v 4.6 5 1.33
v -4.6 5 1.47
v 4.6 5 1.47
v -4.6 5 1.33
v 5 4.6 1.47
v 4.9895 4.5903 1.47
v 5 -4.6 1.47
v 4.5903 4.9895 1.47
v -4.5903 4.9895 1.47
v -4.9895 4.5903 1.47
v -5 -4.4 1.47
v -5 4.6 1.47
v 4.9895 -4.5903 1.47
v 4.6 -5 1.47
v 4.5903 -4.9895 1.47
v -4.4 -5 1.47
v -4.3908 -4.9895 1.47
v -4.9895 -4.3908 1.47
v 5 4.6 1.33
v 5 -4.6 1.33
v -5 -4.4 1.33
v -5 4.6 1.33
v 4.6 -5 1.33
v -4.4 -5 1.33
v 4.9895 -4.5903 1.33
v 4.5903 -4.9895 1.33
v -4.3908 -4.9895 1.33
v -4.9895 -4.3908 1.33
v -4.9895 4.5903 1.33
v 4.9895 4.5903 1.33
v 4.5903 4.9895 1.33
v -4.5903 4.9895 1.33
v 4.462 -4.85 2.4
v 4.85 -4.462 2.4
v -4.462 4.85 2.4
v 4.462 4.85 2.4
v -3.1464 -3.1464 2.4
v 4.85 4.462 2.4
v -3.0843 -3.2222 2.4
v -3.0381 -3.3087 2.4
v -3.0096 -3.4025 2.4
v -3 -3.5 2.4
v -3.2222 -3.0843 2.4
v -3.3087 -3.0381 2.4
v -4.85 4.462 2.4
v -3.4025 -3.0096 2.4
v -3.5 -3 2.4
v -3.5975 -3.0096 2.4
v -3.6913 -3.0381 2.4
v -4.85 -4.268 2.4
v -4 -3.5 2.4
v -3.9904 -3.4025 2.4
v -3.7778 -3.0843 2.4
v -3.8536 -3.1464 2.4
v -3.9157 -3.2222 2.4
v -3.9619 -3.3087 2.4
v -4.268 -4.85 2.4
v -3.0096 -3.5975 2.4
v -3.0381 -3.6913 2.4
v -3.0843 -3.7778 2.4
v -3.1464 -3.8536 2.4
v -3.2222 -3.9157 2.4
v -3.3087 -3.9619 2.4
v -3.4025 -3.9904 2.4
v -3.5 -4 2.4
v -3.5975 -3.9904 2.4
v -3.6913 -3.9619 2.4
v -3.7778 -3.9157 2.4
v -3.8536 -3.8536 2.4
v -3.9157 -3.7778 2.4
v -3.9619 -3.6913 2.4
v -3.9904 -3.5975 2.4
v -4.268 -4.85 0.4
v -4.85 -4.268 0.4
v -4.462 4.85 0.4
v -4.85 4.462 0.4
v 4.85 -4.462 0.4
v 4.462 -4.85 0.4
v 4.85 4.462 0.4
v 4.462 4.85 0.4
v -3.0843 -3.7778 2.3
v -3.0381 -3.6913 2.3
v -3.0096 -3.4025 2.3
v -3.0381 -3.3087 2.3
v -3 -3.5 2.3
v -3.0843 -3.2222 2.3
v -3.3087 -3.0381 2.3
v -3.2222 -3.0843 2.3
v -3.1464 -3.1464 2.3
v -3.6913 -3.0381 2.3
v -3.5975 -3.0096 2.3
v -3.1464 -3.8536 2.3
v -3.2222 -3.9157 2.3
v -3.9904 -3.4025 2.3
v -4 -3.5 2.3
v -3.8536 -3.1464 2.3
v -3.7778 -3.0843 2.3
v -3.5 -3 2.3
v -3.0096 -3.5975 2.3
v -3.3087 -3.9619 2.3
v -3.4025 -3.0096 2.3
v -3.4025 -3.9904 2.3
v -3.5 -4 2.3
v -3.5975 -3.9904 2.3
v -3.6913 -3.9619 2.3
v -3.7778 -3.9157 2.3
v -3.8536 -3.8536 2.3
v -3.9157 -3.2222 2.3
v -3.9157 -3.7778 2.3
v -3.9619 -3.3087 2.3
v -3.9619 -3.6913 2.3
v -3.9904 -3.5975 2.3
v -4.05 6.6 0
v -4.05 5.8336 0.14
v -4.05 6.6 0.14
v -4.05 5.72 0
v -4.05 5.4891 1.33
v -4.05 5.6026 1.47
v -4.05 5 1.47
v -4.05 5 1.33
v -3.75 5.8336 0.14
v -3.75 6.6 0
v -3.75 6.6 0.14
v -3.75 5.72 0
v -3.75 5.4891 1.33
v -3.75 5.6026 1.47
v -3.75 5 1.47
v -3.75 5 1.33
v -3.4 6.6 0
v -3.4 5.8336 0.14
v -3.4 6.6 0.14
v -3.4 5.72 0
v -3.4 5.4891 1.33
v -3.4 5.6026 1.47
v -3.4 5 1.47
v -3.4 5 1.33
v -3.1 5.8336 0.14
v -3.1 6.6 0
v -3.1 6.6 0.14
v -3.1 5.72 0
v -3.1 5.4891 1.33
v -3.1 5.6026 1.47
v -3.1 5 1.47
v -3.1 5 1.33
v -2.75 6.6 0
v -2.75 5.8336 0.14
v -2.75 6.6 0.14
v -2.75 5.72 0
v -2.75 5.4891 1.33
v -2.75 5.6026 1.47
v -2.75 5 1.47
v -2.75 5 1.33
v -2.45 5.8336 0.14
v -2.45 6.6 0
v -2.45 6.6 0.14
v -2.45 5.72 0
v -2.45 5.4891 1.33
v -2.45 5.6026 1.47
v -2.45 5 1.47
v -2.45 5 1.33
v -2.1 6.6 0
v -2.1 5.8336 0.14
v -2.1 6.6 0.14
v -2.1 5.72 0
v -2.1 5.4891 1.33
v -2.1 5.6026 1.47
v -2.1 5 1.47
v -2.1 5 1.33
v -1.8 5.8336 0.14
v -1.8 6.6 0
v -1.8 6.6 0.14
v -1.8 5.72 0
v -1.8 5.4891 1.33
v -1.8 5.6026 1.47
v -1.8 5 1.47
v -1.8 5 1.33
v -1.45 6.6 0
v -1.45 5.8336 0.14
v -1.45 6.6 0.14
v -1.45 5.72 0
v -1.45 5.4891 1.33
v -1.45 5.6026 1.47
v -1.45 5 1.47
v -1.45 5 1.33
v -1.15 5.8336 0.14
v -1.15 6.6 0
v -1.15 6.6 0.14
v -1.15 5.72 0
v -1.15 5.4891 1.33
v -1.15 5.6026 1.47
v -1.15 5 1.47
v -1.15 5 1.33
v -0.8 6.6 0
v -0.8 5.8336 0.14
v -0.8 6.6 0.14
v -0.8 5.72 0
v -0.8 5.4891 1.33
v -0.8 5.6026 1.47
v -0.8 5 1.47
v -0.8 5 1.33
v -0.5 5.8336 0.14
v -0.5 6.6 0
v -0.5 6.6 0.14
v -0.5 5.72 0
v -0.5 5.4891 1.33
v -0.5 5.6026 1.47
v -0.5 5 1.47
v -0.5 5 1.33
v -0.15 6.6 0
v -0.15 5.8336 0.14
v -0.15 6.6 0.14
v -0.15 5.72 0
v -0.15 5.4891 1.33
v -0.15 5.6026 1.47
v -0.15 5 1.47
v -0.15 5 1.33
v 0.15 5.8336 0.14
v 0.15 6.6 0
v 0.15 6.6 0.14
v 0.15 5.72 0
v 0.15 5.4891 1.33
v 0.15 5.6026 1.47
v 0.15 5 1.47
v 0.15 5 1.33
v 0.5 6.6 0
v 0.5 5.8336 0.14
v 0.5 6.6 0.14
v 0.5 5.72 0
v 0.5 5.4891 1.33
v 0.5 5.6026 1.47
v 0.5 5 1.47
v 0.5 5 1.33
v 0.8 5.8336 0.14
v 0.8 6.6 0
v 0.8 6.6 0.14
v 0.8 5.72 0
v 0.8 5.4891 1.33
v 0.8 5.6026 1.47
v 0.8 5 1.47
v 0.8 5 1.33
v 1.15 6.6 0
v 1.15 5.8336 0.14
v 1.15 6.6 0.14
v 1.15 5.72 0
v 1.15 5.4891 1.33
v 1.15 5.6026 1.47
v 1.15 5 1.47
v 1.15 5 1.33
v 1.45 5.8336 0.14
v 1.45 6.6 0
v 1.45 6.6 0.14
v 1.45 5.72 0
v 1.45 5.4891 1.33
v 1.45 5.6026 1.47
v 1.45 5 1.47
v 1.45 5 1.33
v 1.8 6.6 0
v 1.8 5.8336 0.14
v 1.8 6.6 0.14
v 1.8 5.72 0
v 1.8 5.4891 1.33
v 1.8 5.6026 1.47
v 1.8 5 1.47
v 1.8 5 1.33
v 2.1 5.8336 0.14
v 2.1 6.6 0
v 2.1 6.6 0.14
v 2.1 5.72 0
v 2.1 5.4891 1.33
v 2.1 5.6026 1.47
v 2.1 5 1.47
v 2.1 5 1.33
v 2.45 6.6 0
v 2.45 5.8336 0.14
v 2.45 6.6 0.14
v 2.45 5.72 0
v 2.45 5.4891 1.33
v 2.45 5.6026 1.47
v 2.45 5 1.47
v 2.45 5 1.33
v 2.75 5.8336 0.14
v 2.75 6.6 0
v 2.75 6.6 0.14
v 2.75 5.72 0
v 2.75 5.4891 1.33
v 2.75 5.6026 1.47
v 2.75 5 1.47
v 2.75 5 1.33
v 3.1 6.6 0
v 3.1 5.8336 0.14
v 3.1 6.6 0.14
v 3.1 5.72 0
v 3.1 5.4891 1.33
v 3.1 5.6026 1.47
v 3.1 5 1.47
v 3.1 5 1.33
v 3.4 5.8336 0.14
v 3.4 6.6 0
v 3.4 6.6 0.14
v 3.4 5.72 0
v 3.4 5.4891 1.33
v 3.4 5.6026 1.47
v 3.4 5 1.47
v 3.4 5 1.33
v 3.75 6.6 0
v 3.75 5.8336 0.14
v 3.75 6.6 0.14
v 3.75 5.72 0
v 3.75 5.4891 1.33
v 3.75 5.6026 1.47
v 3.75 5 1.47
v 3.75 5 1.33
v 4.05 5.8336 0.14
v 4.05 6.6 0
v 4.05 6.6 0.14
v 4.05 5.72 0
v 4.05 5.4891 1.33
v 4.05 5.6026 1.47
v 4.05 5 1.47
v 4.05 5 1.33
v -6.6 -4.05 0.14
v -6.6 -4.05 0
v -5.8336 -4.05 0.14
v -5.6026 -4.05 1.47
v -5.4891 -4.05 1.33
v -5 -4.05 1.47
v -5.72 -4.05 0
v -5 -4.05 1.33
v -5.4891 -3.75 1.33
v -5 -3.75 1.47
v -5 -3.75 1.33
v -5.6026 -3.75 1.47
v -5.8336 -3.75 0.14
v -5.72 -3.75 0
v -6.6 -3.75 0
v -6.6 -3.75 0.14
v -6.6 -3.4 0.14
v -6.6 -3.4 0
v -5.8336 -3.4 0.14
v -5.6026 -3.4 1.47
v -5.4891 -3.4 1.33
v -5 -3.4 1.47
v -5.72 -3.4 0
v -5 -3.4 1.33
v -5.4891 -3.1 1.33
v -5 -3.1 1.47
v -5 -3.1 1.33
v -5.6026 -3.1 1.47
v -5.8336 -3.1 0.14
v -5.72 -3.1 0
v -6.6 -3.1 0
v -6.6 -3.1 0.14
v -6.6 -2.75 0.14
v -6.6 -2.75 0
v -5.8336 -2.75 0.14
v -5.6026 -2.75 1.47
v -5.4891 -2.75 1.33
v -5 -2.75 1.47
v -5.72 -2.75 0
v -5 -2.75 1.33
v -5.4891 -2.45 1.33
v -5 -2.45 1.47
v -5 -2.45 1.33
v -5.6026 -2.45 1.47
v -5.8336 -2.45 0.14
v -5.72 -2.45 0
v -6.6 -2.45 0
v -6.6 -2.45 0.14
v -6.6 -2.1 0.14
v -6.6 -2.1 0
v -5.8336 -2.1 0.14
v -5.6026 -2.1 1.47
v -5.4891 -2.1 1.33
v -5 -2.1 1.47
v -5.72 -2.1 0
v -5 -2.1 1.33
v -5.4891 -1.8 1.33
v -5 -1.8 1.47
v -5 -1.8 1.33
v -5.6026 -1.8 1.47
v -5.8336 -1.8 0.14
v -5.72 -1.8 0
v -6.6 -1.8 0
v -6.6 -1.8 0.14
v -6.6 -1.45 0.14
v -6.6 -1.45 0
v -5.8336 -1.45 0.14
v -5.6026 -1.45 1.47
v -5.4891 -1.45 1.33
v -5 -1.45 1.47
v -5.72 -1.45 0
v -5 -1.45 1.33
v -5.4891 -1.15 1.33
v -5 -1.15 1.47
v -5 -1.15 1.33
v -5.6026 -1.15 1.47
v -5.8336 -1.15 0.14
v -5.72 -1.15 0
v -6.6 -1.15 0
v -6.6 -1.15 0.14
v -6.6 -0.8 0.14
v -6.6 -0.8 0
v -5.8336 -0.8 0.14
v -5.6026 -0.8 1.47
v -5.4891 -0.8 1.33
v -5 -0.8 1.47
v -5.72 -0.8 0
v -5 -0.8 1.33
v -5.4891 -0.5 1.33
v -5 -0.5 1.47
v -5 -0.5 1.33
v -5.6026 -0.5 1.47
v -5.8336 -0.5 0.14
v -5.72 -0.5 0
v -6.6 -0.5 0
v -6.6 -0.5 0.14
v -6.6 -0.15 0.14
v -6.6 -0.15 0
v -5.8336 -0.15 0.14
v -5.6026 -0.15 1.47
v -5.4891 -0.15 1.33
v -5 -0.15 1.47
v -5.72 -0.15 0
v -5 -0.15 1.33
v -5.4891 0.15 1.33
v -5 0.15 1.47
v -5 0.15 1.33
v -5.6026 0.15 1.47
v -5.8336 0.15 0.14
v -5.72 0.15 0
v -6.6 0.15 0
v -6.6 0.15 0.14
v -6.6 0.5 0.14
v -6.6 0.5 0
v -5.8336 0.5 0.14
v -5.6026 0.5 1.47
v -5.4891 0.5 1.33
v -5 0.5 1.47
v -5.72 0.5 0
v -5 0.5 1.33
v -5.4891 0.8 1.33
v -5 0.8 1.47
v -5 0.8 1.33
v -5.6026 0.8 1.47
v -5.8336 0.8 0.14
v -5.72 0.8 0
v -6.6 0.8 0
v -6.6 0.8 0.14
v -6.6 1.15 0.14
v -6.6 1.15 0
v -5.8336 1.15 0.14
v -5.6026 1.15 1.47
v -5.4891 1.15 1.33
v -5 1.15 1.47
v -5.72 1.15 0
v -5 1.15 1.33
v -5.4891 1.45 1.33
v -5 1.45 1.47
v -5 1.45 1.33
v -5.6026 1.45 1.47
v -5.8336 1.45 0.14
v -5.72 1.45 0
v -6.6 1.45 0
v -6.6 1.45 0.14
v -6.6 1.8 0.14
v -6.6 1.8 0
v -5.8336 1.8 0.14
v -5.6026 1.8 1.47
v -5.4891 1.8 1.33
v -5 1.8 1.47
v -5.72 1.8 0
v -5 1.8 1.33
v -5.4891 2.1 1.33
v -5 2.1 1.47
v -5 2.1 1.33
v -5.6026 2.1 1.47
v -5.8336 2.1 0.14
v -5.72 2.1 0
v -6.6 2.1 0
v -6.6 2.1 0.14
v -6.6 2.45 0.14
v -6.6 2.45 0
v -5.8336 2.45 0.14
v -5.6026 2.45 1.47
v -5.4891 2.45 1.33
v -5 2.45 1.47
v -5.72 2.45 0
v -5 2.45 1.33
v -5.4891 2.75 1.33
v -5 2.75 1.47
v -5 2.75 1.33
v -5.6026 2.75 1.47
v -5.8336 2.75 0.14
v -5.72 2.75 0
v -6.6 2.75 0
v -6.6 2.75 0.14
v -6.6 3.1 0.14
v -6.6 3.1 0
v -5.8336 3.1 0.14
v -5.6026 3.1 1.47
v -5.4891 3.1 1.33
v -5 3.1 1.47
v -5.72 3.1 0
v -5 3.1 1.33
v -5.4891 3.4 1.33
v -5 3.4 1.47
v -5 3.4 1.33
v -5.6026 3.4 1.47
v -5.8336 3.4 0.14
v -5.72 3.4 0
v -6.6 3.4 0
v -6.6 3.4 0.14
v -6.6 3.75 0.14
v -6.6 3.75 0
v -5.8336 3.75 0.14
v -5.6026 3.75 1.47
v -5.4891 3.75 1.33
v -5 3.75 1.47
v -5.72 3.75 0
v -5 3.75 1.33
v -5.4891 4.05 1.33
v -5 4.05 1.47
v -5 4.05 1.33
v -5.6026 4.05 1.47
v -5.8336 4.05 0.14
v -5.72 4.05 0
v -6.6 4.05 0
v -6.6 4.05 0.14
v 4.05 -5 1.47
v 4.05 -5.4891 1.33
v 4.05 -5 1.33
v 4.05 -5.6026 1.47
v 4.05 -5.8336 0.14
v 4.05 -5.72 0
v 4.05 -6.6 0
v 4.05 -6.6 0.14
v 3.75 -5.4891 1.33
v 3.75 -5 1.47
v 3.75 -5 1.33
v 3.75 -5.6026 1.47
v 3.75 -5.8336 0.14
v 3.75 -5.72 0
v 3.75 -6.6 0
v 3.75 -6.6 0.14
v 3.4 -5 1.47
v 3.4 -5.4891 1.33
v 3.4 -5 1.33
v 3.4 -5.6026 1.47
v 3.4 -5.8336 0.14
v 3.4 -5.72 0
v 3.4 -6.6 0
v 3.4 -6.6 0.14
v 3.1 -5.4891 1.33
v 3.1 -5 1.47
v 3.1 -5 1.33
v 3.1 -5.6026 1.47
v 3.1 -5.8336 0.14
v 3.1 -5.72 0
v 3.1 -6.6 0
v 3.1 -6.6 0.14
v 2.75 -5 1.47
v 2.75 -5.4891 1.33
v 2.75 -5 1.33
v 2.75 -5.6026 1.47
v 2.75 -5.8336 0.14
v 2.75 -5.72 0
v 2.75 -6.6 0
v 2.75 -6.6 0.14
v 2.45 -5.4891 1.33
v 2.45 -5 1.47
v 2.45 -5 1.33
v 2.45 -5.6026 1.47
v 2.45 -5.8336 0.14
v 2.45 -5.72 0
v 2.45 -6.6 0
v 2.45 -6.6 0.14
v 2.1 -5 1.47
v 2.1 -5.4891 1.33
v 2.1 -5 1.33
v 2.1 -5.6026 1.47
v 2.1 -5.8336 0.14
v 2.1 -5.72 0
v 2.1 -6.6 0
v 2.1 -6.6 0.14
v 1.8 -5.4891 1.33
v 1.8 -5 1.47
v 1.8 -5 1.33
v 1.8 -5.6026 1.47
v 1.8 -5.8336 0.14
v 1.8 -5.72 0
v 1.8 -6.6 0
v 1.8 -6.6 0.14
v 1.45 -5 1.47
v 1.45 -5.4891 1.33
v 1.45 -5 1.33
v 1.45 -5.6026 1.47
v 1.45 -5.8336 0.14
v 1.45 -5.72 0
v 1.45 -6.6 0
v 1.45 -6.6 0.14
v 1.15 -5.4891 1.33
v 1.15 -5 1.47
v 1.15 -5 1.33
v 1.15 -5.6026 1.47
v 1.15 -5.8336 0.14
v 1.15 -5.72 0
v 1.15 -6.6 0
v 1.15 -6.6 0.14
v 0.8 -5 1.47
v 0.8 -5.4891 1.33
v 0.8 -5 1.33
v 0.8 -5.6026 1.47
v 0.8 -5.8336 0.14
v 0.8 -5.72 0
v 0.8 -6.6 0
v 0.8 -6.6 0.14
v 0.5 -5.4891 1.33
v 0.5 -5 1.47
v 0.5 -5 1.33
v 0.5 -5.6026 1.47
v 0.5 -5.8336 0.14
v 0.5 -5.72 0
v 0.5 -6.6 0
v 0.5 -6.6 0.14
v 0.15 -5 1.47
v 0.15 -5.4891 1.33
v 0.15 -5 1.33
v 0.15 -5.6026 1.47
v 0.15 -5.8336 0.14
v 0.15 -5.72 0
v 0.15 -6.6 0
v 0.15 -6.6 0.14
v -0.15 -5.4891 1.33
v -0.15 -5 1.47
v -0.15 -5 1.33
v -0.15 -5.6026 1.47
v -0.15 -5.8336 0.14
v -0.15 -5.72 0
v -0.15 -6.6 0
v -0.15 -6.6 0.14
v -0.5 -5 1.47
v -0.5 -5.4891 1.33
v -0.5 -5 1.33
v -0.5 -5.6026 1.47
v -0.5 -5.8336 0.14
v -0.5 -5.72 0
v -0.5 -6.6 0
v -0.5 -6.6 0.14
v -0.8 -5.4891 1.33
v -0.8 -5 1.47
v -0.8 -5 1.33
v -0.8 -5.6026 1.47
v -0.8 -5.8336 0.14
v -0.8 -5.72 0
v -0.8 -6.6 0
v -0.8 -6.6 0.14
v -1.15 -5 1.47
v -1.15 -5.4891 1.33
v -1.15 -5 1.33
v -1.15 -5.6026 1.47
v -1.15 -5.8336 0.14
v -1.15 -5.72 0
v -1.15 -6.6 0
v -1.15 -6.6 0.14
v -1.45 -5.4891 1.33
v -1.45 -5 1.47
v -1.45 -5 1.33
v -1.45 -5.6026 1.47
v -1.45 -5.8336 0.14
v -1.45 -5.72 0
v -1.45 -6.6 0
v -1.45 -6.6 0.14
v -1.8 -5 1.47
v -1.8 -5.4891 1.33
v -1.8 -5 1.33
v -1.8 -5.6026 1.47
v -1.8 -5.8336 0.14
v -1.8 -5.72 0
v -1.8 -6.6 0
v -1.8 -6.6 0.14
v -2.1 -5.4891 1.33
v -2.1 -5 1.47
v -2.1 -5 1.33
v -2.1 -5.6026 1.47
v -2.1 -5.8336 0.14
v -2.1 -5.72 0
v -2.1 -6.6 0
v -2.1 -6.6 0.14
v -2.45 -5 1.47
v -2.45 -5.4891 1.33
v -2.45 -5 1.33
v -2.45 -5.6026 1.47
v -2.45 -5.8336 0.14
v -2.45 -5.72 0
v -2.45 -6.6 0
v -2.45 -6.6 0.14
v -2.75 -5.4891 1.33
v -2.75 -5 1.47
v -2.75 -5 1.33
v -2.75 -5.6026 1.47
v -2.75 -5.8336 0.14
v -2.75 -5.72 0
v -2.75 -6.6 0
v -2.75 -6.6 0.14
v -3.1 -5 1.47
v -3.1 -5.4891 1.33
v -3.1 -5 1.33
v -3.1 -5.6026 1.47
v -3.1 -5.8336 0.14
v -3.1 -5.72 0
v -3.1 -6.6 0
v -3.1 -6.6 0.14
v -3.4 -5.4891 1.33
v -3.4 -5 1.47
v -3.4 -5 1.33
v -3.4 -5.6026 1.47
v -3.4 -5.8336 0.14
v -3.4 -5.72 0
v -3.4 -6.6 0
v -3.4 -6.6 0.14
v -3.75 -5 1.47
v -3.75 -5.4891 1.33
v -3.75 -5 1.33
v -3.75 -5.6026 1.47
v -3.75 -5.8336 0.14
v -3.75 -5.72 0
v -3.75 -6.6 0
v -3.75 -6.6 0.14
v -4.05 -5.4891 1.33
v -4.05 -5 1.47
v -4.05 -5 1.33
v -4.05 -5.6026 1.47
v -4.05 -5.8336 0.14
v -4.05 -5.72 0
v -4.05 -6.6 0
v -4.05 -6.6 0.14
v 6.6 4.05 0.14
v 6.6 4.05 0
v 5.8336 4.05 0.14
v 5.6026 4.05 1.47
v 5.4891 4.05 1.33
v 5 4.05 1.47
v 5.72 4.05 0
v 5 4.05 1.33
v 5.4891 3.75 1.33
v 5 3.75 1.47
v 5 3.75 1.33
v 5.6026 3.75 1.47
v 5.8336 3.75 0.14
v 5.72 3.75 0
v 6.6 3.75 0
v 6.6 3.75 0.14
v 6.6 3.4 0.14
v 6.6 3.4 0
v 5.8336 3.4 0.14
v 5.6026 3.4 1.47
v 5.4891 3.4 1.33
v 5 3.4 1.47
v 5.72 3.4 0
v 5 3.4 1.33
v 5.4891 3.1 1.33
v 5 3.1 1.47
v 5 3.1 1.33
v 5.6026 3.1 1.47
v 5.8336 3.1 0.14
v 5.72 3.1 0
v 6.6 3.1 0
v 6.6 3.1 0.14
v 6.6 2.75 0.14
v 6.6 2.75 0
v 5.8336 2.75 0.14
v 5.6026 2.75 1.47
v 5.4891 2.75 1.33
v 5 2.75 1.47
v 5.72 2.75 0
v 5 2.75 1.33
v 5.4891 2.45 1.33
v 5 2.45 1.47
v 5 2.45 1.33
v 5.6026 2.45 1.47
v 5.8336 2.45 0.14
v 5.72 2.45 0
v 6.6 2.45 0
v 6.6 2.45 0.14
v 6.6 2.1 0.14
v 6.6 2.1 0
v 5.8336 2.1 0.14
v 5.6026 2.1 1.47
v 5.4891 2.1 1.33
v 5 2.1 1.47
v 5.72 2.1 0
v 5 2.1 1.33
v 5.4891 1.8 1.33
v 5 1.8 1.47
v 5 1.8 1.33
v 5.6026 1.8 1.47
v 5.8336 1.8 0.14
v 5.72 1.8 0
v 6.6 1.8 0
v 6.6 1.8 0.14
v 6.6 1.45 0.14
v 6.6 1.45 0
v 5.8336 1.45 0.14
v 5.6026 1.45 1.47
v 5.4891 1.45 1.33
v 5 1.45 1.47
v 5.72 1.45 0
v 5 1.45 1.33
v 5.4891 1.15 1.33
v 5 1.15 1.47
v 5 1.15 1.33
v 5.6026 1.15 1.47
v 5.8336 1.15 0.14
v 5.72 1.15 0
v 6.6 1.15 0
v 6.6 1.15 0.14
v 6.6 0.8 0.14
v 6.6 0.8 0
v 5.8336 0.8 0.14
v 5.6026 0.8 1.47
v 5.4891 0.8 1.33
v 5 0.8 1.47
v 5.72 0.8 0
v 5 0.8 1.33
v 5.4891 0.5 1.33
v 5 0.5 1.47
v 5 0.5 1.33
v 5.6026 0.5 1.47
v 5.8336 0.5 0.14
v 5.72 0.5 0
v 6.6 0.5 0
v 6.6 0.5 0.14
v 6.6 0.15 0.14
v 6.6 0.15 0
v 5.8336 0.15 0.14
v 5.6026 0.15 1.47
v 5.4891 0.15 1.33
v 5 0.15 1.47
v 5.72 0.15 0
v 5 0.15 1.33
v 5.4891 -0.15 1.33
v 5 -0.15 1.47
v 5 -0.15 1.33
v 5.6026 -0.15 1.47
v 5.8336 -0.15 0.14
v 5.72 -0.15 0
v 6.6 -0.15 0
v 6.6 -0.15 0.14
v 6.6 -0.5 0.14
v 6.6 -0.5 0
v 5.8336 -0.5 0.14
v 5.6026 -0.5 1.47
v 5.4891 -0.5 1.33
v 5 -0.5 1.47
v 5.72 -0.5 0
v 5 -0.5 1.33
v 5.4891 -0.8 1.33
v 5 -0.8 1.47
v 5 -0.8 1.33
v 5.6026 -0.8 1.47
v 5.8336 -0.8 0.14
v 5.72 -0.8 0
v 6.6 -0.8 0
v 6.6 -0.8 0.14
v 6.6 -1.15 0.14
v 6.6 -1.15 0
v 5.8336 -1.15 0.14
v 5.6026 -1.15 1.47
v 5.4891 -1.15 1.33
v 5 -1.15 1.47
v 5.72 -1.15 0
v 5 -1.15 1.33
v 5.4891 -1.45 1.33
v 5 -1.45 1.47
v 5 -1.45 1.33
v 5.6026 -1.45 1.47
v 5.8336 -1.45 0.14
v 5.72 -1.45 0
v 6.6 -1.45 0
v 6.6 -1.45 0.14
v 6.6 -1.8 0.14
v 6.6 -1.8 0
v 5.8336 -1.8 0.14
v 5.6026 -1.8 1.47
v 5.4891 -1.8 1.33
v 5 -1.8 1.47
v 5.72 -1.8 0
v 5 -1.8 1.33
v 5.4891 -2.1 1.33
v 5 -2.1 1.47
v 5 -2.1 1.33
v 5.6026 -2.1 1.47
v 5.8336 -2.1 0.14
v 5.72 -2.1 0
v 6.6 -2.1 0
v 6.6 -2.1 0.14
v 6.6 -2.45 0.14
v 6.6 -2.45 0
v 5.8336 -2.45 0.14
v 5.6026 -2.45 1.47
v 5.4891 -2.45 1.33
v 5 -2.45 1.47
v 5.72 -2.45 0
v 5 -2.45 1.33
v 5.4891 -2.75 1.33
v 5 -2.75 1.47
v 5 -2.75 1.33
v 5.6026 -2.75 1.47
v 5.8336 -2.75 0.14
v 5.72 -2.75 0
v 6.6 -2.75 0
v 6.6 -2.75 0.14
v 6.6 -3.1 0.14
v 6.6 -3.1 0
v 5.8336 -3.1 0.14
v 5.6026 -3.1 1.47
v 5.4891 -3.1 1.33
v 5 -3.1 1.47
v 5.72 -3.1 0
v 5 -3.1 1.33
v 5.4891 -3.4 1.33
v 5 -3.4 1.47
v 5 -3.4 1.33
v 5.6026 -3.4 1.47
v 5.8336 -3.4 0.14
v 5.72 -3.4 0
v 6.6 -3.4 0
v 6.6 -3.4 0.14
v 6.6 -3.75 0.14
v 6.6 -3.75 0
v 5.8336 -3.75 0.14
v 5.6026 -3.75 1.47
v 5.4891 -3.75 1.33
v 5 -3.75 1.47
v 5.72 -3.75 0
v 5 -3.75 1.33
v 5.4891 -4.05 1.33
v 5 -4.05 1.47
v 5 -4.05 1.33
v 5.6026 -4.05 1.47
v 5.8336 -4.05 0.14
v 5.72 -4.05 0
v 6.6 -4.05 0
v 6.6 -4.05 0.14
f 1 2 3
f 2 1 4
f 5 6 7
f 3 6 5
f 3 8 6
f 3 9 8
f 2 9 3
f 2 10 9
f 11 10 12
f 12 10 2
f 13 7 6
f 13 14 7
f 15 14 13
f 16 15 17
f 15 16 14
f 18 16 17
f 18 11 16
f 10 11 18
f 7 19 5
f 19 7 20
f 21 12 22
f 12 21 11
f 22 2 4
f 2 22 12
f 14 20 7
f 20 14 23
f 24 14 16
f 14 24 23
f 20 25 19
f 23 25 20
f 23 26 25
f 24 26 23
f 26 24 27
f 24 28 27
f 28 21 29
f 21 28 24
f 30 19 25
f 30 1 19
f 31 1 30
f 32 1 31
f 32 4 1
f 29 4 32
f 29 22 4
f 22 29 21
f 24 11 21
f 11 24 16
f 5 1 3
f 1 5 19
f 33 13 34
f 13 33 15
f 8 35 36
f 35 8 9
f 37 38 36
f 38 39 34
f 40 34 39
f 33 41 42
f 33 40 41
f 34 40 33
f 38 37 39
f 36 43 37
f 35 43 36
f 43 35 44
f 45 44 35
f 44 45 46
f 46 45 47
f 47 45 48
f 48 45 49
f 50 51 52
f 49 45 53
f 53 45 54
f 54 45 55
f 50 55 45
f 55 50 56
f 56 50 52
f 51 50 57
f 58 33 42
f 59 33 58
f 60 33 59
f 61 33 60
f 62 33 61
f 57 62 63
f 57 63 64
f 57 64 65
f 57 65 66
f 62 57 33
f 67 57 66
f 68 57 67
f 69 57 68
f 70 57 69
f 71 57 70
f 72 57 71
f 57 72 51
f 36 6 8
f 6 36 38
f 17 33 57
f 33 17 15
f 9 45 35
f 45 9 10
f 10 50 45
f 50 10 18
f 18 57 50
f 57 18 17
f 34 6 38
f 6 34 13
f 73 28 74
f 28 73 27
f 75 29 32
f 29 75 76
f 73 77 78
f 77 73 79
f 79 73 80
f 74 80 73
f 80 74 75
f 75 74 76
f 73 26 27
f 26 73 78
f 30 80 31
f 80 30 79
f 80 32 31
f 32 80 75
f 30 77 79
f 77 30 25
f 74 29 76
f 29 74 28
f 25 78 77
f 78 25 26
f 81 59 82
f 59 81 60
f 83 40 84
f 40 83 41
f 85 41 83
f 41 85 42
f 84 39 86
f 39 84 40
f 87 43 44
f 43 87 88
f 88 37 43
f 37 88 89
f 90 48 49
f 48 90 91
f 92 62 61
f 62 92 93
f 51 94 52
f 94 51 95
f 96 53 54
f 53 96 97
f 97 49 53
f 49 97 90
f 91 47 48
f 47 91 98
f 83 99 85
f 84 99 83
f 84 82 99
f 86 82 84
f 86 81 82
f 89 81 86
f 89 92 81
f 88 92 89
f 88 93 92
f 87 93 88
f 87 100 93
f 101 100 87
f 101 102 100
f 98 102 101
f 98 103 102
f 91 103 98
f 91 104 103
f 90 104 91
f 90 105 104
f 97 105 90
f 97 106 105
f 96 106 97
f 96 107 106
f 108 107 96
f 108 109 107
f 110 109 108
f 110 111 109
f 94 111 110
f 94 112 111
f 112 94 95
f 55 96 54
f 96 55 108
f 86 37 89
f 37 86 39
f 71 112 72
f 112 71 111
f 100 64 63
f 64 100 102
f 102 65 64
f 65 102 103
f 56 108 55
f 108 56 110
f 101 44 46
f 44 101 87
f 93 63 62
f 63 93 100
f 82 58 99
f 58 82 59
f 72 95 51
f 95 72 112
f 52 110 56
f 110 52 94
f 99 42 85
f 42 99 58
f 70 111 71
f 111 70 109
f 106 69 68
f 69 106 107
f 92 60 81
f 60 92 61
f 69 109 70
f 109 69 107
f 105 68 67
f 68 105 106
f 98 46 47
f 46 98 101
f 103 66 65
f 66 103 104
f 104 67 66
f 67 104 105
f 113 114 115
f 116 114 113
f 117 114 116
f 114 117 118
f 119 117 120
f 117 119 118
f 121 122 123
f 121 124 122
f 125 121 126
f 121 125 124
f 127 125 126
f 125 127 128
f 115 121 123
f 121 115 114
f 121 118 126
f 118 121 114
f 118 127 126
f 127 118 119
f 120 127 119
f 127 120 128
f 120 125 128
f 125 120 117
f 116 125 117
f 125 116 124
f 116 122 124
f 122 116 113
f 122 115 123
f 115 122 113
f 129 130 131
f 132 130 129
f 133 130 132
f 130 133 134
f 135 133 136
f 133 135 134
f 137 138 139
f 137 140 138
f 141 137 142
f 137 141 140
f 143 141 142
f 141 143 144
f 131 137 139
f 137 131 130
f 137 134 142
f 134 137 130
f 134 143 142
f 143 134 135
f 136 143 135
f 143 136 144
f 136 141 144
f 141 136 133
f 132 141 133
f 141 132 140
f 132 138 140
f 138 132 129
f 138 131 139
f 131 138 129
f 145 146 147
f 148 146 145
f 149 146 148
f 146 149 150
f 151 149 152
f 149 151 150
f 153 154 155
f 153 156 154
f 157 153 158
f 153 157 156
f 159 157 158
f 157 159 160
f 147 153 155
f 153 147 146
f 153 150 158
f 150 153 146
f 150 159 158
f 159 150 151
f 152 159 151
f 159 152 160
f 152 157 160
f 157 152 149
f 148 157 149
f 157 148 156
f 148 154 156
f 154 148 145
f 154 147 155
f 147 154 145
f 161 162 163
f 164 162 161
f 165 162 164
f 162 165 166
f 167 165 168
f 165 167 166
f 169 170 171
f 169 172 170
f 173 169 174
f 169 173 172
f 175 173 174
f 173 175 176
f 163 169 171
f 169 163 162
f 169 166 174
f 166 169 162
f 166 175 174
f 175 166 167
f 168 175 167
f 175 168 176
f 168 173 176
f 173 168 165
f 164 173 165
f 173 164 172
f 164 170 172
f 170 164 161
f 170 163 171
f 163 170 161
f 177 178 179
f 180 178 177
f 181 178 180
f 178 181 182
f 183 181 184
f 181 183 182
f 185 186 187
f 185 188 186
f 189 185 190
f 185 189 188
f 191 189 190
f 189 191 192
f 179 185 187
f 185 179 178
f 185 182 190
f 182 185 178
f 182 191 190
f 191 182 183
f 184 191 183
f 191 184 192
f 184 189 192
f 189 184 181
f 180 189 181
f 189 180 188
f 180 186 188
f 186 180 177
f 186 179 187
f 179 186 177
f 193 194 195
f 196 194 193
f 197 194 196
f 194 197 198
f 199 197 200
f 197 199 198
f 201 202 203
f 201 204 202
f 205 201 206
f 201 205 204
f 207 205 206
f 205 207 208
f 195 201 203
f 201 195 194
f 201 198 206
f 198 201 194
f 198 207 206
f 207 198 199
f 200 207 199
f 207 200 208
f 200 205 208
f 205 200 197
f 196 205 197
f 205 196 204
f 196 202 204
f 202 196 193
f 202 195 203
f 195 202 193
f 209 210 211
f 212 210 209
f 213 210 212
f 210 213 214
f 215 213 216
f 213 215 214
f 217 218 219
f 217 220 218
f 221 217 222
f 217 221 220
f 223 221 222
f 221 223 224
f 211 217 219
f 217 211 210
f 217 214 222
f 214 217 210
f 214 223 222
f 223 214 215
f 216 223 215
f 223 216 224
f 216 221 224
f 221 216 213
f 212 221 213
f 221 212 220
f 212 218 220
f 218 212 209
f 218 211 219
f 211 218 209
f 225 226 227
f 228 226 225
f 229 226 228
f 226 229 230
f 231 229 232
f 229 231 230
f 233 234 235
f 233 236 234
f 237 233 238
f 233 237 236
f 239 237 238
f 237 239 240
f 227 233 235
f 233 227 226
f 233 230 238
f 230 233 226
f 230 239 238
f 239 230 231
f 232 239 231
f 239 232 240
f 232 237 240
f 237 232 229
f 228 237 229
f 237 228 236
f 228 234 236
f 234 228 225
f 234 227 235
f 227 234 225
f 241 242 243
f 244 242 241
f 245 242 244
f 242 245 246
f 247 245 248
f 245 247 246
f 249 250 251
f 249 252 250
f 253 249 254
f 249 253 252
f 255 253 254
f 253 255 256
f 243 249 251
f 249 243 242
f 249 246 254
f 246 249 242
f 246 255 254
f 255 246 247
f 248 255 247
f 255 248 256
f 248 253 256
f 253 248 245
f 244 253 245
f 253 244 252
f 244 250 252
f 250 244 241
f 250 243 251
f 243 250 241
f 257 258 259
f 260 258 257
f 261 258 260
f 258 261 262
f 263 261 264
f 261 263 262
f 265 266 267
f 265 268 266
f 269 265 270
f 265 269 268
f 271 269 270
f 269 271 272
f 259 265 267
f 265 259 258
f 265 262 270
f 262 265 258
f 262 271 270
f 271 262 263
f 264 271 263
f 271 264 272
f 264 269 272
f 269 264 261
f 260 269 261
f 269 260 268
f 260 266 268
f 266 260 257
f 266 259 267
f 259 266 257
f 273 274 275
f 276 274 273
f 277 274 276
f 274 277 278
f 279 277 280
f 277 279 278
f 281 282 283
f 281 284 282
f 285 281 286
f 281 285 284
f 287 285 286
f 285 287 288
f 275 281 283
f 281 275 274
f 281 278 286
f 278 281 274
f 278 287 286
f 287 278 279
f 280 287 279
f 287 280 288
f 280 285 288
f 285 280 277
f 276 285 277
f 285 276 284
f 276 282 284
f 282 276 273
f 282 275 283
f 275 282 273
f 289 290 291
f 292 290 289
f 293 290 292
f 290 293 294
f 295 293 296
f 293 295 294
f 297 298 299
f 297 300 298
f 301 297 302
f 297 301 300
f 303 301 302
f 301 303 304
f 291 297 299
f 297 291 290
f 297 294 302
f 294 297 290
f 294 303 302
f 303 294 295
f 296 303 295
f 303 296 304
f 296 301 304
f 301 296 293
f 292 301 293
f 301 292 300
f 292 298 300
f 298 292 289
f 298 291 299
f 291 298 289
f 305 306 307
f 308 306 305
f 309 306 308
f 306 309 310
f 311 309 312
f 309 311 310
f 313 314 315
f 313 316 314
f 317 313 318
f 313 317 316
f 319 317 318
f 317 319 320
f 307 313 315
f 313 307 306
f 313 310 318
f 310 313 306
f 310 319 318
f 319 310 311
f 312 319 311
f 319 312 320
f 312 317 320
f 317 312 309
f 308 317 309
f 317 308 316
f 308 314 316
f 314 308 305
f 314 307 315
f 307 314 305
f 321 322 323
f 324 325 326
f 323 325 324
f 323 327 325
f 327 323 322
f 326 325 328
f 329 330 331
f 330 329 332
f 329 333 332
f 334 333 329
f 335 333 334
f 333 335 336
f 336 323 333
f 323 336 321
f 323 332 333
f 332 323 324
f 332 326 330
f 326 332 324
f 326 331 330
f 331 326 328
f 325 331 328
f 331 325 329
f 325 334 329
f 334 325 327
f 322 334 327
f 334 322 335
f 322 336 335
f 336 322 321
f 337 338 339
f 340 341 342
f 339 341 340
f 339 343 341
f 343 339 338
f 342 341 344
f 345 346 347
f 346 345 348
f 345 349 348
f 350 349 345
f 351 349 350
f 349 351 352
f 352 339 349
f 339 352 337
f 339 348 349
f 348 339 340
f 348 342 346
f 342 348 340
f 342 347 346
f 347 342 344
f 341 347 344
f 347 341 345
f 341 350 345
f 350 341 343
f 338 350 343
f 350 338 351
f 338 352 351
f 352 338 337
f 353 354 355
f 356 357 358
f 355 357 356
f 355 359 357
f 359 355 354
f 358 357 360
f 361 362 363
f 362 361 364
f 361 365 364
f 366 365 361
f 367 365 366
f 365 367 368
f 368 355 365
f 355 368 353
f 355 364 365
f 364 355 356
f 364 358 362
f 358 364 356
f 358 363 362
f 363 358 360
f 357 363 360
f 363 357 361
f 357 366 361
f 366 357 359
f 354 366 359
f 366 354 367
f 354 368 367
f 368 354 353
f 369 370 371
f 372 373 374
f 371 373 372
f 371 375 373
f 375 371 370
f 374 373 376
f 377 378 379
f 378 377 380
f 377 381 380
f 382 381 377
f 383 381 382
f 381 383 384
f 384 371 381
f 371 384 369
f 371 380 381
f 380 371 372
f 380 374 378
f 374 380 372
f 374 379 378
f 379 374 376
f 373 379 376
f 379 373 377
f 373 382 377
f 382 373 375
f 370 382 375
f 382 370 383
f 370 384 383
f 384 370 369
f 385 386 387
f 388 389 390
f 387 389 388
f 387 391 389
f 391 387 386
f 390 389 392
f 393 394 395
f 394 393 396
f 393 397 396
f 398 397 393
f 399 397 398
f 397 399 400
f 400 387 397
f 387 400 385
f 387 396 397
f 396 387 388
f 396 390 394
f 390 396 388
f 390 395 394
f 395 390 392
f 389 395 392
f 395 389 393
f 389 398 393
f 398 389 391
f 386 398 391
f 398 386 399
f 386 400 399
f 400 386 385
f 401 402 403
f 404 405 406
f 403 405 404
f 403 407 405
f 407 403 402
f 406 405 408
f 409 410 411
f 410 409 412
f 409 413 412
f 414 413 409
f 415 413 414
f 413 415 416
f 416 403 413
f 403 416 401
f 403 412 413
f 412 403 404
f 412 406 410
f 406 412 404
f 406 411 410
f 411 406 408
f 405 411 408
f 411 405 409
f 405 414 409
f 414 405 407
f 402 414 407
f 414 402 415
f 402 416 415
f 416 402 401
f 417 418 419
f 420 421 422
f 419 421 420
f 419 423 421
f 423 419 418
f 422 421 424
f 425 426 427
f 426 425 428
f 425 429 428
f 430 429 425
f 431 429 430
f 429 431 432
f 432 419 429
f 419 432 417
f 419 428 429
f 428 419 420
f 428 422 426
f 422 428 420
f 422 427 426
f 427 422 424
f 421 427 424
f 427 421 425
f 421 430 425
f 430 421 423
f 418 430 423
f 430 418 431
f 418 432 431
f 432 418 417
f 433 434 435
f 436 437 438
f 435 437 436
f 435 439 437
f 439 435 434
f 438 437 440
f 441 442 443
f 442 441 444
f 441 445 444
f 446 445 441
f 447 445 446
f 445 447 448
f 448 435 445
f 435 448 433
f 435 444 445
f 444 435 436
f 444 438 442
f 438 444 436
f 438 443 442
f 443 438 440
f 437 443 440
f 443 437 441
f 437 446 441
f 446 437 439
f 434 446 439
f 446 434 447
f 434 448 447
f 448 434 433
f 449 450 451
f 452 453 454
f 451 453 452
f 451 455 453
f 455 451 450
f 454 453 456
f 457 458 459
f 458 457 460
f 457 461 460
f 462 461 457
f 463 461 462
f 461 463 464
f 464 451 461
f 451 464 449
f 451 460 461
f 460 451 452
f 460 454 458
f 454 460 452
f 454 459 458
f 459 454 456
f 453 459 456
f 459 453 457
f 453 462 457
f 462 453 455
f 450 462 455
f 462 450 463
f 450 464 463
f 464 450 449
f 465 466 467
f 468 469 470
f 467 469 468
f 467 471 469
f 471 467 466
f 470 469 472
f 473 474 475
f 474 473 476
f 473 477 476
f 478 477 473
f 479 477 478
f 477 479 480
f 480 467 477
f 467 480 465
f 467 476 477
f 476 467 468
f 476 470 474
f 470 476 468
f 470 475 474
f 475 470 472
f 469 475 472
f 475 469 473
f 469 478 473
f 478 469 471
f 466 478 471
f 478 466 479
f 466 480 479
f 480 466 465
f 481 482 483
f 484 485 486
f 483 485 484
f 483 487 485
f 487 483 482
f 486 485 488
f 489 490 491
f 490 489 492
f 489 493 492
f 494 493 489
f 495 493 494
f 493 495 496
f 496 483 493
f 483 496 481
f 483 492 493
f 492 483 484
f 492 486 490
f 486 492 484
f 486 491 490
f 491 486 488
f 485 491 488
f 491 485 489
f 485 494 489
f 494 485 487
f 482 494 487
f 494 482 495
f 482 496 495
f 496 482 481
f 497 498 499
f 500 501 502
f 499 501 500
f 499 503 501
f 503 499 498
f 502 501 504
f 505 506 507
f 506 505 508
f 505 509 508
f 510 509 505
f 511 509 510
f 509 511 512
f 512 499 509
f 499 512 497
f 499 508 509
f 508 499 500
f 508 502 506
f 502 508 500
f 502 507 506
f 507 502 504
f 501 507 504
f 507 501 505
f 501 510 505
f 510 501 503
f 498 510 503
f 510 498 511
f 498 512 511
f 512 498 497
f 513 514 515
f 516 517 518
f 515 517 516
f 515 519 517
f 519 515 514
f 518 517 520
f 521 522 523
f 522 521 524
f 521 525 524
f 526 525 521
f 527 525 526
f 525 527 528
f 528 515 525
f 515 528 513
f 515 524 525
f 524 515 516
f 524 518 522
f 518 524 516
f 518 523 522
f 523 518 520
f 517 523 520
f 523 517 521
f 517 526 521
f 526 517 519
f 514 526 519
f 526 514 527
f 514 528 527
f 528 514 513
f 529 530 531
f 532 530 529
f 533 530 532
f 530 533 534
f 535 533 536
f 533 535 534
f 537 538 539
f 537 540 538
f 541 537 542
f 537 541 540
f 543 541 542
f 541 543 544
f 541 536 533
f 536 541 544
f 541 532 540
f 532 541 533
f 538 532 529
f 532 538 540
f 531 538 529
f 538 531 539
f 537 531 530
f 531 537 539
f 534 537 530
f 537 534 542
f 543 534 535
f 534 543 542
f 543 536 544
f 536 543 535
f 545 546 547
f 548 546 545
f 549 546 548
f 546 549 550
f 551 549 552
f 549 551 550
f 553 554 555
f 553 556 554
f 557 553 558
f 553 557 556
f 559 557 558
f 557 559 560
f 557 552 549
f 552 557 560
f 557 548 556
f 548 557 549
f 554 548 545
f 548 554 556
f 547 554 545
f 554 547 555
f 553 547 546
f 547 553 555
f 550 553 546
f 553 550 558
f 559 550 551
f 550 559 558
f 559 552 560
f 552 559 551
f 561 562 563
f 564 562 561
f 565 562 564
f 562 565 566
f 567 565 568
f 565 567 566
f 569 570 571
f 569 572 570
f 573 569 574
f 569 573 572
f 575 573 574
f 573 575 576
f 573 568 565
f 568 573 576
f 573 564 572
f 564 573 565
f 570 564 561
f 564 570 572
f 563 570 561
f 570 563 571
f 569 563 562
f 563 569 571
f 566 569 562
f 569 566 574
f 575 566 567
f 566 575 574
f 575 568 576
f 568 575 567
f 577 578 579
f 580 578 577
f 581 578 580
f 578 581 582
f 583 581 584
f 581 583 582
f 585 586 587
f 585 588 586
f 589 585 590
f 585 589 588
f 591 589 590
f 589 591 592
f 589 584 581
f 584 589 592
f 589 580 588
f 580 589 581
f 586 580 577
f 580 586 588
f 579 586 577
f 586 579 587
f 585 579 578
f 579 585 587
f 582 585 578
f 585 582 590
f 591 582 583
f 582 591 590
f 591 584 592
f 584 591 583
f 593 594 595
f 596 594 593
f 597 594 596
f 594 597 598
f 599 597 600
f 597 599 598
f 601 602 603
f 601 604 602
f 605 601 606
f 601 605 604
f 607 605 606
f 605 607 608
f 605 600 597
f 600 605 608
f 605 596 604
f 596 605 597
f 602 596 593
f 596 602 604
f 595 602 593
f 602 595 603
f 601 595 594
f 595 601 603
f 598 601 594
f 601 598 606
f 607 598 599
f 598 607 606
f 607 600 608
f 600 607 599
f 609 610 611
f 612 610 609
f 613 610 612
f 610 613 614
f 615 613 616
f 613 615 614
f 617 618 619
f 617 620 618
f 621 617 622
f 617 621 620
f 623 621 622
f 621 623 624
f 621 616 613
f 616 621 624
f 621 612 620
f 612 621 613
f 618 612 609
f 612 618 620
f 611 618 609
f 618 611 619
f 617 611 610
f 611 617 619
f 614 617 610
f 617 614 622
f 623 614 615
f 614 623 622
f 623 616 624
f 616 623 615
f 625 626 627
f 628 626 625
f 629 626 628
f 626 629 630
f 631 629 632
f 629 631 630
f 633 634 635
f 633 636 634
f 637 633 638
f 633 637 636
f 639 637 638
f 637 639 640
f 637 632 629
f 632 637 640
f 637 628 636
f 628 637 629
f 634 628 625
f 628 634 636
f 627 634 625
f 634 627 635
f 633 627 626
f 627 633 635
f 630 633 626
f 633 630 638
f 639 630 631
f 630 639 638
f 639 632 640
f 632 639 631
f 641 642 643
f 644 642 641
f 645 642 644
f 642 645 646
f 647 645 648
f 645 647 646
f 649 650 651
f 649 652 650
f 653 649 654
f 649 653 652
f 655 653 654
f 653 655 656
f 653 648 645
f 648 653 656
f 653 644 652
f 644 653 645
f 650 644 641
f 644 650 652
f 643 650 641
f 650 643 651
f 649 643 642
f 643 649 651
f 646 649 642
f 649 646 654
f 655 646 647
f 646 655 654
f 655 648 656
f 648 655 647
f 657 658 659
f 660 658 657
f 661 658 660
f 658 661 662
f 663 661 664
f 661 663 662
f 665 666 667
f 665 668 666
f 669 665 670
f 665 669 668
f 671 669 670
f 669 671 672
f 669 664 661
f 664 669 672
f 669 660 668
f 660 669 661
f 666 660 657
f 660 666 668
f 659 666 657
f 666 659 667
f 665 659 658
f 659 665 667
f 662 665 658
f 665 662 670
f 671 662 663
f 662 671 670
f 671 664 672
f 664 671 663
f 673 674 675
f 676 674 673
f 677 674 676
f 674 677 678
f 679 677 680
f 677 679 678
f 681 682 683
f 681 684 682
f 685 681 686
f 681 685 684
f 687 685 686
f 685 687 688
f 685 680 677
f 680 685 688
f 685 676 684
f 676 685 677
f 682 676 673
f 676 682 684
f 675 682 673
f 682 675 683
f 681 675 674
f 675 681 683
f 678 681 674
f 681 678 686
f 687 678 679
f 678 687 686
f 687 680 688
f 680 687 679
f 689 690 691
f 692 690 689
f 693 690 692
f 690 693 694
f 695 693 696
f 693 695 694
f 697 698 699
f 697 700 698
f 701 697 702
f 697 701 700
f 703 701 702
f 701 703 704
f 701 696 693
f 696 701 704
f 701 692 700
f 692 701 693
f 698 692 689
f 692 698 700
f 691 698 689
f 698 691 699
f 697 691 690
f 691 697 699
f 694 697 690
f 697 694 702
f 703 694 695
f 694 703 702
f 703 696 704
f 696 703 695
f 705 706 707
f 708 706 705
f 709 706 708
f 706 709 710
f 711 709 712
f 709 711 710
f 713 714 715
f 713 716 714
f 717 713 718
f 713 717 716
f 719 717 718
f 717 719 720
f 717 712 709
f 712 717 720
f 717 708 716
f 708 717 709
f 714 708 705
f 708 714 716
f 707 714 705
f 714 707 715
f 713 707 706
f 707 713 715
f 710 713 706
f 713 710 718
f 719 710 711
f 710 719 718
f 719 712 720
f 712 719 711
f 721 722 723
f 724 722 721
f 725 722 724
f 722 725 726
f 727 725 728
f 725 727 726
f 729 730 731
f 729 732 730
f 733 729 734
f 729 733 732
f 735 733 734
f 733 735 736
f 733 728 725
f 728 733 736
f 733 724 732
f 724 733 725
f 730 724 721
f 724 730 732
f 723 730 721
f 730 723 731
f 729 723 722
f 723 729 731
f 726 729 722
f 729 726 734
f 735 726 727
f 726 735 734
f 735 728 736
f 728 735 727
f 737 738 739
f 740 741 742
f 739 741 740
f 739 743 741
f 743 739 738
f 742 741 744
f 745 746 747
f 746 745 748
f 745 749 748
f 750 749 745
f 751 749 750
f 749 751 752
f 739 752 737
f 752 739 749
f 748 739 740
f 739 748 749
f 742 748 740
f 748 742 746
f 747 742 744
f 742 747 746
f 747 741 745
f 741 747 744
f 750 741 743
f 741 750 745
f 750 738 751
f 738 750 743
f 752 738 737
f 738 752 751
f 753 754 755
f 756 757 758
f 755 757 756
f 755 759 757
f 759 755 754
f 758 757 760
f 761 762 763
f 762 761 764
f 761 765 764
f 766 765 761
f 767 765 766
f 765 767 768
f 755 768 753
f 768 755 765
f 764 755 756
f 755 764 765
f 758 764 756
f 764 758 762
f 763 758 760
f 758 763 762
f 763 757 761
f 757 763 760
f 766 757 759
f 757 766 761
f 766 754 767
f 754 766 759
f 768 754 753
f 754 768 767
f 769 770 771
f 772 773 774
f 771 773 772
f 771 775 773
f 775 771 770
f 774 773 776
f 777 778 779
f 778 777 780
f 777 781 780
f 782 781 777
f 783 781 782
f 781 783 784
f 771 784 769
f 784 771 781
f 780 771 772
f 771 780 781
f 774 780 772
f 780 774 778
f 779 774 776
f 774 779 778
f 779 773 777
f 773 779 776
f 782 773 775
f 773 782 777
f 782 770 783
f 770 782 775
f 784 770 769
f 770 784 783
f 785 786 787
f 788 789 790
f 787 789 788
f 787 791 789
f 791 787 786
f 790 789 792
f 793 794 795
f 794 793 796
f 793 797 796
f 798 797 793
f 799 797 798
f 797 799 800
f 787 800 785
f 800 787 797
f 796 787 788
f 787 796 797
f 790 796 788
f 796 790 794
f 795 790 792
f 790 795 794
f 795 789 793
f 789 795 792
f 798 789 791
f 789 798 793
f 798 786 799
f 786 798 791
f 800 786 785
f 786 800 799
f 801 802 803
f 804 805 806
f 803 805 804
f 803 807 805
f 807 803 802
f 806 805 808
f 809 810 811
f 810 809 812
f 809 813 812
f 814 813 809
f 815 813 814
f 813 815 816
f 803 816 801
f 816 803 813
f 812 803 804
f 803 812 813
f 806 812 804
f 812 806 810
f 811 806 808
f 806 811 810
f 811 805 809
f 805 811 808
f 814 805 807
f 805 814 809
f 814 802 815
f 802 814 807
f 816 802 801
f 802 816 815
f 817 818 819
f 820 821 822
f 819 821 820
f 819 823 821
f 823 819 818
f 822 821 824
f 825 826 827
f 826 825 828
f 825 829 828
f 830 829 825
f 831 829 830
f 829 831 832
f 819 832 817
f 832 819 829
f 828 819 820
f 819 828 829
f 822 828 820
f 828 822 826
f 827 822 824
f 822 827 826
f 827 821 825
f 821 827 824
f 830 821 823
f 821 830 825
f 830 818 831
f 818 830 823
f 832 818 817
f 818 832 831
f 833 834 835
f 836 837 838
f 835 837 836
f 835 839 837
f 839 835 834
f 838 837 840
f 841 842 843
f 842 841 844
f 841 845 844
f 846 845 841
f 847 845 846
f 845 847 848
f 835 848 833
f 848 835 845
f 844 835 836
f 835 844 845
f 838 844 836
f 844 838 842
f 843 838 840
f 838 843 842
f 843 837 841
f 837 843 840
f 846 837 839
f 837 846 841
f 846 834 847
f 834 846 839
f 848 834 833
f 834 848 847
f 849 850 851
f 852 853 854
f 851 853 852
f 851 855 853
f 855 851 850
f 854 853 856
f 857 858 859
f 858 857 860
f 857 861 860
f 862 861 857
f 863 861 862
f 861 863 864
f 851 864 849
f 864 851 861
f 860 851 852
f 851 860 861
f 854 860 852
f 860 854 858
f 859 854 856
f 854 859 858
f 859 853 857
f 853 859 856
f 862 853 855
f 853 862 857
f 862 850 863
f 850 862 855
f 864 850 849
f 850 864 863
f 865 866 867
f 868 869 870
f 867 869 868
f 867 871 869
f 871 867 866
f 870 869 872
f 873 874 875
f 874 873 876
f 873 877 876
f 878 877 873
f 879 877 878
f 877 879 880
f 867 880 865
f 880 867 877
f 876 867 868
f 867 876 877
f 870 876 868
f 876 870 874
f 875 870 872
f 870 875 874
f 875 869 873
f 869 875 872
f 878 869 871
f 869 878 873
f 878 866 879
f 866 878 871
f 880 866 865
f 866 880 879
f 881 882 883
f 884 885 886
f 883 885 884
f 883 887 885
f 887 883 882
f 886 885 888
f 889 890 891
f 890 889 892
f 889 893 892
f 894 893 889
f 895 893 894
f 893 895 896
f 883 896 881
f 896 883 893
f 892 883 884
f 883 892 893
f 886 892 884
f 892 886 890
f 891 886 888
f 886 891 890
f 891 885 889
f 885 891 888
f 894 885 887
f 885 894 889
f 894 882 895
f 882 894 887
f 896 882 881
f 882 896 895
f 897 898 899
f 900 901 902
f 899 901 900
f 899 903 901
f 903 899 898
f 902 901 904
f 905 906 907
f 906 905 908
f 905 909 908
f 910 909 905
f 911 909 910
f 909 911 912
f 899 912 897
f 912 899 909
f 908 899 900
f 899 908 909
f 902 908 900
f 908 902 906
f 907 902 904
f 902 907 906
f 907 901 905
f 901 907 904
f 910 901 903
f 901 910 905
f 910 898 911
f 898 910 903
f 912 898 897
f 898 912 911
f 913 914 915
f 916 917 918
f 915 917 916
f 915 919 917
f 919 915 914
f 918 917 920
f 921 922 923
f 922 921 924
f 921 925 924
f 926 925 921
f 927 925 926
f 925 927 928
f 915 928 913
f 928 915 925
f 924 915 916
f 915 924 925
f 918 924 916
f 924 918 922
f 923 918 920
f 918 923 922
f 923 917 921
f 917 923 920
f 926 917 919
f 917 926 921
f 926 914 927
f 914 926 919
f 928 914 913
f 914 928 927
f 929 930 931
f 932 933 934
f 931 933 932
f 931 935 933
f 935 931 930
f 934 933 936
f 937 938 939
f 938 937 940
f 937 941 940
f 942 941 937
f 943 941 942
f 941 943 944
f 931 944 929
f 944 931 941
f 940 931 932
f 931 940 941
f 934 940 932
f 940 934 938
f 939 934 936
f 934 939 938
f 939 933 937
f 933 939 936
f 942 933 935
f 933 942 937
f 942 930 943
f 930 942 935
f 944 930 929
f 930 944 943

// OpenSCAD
pins = 52;
pin_pitch = 0.65;
pin_width = 0.3;
pin_seating = 0.88;
pin_gull_angle = 10;
leadframe_thickness = 0.14;

overall_width = 13.2;
overall_length = 13.2;
body_width = 10;
body_length = 10;
body_thickness = 2;
total_thickness = 2.4;

body_bevel = 0.3;
body_chamfer = 0.4;
body_chamfer_index = 0.6;


leadframe_height = total_thickness - body_thickness/2;

index_mark_offset = min(min(body_width, body_length) * 0.4, 1.5);
index_mark_radius = min(index_mark_offset / 3, 0.5);


difference() {
    body();
    color("#ddd") translate([
        -body_length / 2 + index_mark_offset,
        -body_width / 2 + index_mark_offset,
        total_thickness - 0.1,
    ]) cylinder(h = 10, r = index_mark_radius, $fn=32);
}


translate([pin_pitch * ((pins / 4) - 1) / -2, overall_width / 2, 0]) for(n = [0 : pins / 4 - 1]) {
    translate([pin_pitch * n, 0, 0]) pin();
}
rotate([0, 0, 90]) translate([pin_pitch * ((pins / 4) - 1) / -2, overall_width / 2, 0]) for(n = [0 : pins / 4 - 1]) {
    translate([pin_pitch * n, 0, 0]) pin();
}
rotate([0, 0, 180]) translate([pin_pitch * ((pins / 4) - 1) / -2, overall_width / 2, 0]) for(n = [0 : pins / 4 - 1]) {
    translate([pin_pitch * n, 0, 0]) pin();
}
rotate([0, 0, 270]) translate([pin_pitch * ((pins / 4) - 1) / -2, overall_width / 2, 0]) for(n = [0 : pins / 4 - 1]) {
    translate([pin_pitch * n, 0, 0]) pin();
}

module pin() {
    color("#999") rotate([90, 0, 90]) linear_extrude(height = pin_width, center = true) {
        gull_offset = leadframe_height - leadframe_thickness / 2;
        pin_length = (overall_width - body_width) / 2;
        sine = sin(pin_gull_angle);
        cosine = cos(pin_gull_angle);
        polygon([
            [0, 0],
            [-pin_seating, 0],
            [-pin_seating - sine * gull_offset, gull_offset],
            [-pin_length, gull_offset],
            [-pin_length, gull_offset + leadframe_thickness],
            [-pin_seating - sine * (gull_offset + leadframe_thickness) + cosine * leadframe_thickness, gull_offset + leadframe_thickness],
            [-pin_seating - sine * leadframe_thickness + cosine * leadframe_thickness, leadframe_thickness],
            [0, leadframe_thickness],
        ]);
    }
}


module body() {
    color("#555") translate([0, 0, leadframe_height]) {
        linear_extrude(height = leadframe_thickness, center = true) body_outline();
        linear_extrude(
            height = body_thickness / 2,
            scale = [(body_length - body_bevel) / body_length, (body_width - body_bevel) / body_width]
        ) body_outline();
        
        scale([1, 1, -1]) linear_extrude(
            height = body_thickness / 2,
            scale = [(body_length - body_bevel) / body_length, (body_width - body_bevel) / body_width]
        ) body_outline();
    }
}
module body_outline() {
    polygon([
        [ -body_length/2 + body_chamfer_index, -body_width/2 ],
        [ -body_length/2               , -body_width/2 + body_chamfer_index ],
        [ -body_length/2               , +body_width/2 - body_chamfer ],
        [ -body_length/2 + body_chamfer, +body_width/2 ],
        [ +body_length/2 - body_chamfer, +body_width/2 ],
        [ +body_length/2               , +body_width/2 - body_chamfer ],
        [ +body_length/2               , -body_width/2 + body_chamfer ],
        [ +body_length/2 - body_chamfer, -body_width/2 ],
    ]);
}
